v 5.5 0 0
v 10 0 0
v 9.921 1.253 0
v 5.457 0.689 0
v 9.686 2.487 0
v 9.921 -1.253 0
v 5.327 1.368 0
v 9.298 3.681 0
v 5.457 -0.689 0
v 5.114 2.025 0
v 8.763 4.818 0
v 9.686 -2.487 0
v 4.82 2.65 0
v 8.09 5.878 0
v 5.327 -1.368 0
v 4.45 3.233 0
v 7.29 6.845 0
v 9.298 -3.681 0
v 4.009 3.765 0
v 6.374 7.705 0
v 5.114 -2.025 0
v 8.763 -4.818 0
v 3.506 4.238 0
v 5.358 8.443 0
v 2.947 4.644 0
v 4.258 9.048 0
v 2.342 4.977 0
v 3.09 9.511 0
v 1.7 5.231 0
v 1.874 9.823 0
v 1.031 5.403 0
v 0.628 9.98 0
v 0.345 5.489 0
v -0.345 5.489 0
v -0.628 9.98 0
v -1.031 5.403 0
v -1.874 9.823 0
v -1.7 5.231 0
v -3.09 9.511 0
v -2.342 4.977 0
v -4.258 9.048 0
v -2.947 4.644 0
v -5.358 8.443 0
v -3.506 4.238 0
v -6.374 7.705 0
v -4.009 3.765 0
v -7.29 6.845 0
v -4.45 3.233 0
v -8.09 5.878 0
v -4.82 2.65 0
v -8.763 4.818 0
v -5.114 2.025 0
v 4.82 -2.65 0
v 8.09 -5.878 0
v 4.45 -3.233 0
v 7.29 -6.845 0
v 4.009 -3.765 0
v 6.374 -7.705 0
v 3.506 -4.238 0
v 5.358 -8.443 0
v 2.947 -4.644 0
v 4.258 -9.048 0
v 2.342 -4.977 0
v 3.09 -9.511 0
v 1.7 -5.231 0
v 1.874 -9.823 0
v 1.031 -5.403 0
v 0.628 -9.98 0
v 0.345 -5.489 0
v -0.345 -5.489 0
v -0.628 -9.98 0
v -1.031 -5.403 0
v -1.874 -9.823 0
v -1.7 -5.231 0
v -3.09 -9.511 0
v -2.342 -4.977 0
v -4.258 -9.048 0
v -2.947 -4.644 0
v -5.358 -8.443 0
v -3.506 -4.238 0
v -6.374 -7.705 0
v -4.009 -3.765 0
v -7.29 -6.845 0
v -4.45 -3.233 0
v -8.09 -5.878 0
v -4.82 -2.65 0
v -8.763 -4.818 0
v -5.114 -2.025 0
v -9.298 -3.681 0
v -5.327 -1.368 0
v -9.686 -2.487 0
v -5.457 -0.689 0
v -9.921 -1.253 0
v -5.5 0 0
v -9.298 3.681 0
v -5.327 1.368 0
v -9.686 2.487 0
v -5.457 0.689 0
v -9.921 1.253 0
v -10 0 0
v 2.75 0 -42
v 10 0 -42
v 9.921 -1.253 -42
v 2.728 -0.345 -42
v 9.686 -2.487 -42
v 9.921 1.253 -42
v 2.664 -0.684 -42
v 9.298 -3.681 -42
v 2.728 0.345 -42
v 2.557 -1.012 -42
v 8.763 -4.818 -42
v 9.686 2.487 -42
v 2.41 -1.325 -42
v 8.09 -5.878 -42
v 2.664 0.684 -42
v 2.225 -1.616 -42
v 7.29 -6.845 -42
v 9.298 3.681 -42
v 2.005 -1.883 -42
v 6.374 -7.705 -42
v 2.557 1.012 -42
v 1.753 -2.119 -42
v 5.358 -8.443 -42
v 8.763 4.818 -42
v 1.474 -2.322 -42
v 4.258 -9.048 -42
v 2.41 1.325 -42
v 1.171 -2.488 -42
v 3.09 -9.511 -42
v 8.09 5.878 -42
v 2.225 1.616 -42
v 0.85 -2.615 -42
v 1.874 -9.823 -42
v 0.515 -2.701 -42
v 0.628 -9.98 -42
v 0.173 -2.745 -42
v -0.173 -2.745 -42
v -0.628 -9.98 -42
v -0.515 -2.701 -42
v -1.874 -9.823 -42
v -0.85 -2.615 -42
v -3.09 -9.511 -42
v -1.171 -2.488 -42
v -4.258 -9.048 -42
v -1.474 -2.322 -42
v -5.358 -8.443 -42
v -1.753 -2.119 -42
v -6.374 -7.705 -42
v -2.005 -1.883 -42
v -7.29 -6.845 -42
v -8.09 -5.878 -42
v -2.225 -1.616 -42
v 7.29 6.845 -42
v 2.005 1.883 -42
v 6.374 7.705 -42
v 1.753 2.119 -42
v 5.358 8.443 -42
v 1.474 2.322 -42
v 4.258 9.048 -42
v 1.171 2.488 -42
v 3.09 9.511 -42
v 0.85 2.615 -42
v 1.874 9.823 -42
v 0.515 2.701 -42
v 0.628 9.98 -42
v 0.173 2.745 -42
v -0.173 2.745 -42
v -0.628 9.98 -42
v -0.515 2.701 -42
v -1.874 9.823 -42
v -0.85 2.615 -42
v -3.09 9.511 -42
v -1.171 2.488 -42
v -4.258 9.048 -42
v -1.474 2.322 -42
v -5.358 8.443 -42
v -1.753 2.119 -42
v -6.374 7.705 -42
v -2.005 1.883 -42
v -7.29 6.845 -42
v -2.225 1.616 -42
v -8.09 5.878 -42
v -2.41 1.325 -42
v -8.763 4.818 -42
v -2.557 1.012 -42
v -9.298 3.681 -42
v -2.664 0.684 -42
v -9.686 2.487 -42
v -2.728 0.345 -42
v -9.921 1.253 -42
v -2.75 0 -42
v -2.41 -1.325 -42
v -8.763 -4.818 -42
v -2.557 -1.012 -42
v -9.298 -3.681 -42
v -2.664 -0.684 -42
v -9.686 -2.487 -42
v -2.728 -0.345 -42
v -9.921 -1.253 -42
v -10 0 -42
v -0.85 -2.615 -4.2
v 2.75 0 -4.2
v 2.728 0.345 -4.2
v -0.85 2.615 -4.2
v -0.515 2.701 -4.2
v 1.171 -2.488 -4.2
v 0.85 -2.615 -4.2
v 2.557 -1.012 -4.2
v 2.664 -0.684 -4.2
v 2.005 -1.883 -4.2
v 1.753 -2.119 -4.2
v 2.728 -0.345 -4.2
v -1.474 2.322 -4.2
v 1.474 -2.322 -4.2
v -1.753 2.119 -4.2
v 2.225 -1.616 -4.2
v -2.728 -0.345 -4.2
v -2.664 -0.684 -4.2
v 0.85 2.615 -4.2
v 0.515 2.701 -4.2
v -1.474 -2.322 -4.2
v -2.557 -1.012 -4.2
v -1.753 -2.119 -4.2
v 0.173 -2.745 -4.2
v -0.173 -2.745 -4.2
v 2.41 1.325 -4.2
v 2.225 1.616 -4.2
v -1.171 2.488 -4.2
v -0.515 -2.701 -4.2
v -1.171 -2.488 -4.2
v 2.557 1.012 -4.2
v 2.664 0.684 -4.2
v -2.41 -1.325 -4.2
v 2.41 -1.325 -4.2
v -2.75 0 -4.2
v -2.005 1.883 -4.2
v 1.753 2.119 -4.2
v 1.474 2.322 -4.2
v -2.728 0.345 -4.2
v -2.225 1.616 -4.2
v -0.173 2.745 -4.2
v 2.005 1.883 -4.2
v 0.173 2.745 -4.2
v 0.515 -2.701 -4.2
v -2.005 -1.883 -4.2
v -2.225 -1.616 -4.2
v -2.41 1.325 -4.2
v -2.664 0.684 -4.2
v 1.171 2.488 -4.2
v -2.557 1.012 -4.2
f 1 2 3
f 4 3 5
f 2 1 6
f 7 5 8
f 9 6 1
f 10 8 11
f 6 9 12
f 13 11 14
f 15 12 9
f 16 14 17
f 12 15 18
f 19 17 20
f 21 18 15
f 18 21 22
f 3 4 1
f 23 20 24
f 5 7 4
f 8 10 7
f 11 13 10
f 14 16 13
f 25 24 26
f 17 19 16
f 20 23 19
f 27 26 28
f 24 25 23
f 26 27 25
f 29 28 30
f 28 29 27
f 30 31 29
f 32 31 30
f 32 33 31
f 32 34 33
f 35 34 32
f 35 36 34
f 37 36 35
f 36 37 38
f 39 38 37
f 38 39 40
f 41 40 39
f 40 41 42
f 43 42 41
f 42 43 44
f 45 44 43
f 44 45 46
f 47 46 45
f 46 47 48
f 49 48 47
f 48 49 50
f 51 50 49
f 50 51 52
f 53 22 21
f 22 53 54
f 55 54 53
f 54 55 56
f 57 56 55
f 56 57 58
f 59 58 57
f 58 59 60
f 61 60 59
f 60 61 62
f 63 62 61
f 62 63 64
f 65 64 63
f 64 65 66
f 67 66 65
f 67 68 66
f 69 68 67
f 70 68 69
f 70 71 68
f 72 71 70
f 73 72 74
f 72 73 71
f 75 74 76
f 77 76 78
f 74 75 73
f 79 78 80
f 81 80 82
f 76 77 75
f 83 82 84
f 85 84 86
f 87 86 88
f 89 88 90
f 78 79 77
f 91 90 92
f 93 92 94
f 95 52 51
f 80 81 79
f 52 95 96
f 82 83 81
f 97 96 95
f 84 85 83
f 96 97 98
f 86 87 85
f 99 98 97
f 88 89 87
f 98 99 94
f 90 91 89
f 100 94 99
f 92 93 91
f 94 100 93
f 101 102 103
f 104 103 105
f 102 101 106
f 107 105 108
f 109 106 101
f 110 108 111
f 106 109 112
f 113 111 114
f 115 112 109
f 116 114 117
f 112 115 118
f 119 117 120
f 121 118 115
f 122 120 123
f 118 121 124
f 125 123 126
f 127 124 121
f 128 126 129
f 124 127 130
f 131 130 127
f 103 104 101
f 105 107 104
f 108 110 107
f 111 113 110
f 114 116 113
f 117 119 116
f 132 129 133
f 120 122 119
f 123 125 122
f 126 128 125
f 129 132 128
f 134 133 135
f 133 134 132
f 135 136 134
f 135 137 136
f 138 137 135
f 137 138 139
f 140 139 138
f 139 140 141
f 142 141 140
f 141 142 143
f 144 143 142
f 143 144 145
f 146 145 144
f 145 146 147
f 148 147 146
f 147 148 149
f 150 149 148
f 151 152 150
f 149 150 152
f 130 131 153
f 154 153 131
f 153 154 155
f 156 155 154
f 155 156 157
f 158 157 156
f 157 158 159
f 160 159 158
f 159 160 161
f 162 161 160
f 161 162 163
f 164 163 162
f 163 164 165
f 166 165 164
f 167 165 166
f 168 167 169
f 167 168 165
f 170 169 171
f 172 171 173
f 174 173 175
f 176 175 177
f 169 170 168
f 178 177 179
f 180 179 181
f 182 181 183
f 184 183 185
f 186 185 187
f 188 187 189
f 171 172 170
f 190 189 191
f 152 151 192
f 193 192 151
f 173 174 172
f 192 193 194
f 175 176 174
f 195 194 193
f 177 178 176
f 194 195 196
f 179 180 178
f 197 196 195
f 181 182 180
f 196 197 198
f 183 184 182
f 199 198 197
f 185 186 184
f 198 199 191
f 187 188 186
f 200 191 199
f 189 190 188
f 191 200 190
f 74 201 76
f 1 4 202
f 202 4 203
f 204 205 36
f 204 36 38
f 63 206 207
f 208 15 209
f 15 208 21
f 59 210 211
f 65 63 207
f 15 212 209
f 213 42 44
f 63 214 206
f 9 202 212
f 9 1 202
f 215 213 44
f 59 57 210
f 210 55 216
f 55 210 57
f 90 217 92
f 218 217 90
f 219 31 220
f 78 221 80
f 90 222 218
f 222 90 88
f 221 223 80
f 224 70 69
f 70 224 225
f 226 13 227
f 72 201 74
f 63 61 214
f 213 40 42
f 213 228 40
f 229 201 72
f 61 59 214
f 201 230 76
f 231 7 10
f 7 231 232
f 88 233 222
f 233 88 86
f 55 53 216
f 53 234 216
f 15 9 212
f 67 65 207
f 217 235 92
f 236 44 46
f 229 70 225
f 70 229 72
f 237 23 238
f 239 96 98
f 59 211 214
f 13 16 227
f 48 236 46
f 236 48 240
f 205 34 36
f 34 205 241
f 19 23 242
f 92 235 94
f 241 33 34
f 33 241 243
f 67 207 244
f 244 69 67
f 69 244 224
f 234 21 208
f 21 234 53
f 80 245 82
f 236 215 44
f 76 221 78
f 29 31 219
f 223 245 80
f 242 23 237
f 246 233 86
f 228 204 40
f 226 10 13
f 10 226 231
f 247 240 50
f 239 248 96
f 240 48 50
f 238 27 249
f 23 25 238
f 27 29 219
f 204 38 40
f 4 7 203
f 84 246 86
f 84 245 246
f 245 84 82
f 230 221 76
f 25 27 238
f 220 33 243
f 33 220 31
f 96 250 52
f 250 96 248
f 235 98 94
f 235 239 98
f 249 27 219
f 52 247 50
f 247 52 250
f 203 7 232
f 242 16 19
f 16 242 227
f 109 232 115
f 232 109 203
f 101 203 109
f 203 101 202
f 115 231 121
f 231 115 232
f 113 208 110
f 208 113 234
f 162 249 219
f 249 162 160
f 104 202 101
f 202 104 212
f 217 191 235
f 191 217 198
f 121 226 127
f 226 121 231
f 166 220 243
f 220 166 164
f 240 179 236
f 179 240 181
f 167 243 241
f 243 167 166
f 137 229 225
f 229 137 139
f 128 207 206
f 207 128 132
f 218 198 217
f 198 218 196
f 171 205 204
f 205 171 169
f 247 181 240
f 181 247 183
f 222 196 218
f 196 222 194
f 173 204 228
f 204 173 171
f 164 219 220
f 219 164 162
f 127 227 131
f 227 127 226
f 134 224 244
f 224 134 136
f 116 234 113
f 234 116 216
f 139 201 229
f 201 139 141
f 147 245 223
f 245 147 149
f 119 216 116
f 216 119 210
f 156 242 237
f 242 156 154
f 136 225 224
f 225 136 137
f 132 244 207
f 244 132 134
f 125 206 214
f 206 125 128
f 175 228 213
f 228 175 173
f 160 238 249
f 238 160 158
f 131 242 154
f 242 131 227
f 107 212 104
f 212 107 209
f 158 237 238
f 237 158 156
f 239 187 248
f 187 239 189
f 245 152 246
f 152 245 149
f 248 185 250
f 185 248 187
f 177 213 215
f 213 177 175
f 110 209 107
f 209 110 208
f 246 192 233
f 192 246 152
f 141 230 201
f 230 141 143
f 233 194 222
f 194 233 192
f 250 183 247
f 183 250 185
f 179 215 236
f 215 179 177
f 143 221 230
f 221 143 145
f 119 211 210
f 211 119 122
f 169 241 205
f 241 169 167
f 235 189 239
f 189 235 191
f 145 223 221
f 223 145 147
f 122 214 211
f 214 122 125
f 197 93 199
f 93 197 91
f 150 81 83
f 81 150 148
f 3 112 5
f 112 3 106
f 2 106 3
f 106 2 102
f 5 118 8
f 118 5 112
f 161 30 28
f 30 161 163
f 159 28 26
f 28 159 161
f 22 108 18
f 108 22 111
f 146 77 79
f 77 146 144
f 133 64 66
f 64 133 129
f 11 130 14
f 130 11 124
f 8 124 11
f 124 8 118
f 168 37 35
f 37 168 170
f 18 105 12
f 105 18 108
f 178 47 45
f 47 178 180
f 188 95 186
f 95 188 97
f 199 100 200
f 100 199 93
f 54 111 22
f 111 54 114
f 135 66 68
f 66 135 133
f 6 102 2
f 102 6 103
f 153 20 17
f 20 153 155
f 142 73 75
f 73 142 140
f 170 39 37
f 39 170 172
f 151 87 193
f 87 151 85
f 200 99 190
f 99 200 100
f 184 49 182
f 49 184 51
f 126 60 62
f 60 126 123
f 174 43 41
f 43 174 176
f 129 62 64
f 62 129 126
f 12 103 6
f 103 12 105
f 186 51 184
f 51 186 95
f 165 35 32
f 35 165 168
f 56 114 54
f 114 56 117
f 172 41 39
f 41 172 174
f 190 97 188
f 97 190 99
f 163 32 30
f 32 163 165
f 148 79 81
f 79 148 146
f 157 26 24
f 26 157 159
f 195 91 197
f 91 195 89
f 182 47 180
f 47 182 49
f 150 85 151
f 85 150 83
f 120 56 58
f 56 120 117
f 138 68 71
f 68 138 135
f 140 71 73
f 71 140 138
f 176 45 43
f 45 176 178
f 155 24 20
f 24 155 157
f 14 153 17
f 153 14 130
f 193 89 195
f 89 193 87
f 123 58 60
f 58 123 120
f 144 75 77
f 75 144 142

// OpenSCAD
$fn = 50;


difference() {
	union() {
		translate(v = [0, 0, -42.0000000000]) {
			cylinder(h = 42, r = 10.0000000000);
		}
		cylinder(h = 0, r = 19.0000000000);
	}
	union() {
		translate(v = [0, 0, 0]) {
			rotate(a = [0, 0, 0]) {
				difference() {
					union() {
						#translate(v = [0, 0, -42.0000000000]) {
							cylinder(h = 42, r = 2.2500000000);
						}
						#translate(v = [0, 0, -4.2000000000]) {
							cylinder(h = 4.2000000000, r1 = 2.7500000000, r2 = 5.5000000000);
						}
						#translate(v = [0, 0, -42.0000000000]) {
							cylinder(h = 42, r = 2.7500000000);
						}
						#translate(v = [0, 0, -42.0000000000]) {
							cylinder(h = 42, r = 2.2500000000);
						}
					}
					union();
				}
			}
		}
	}
}
